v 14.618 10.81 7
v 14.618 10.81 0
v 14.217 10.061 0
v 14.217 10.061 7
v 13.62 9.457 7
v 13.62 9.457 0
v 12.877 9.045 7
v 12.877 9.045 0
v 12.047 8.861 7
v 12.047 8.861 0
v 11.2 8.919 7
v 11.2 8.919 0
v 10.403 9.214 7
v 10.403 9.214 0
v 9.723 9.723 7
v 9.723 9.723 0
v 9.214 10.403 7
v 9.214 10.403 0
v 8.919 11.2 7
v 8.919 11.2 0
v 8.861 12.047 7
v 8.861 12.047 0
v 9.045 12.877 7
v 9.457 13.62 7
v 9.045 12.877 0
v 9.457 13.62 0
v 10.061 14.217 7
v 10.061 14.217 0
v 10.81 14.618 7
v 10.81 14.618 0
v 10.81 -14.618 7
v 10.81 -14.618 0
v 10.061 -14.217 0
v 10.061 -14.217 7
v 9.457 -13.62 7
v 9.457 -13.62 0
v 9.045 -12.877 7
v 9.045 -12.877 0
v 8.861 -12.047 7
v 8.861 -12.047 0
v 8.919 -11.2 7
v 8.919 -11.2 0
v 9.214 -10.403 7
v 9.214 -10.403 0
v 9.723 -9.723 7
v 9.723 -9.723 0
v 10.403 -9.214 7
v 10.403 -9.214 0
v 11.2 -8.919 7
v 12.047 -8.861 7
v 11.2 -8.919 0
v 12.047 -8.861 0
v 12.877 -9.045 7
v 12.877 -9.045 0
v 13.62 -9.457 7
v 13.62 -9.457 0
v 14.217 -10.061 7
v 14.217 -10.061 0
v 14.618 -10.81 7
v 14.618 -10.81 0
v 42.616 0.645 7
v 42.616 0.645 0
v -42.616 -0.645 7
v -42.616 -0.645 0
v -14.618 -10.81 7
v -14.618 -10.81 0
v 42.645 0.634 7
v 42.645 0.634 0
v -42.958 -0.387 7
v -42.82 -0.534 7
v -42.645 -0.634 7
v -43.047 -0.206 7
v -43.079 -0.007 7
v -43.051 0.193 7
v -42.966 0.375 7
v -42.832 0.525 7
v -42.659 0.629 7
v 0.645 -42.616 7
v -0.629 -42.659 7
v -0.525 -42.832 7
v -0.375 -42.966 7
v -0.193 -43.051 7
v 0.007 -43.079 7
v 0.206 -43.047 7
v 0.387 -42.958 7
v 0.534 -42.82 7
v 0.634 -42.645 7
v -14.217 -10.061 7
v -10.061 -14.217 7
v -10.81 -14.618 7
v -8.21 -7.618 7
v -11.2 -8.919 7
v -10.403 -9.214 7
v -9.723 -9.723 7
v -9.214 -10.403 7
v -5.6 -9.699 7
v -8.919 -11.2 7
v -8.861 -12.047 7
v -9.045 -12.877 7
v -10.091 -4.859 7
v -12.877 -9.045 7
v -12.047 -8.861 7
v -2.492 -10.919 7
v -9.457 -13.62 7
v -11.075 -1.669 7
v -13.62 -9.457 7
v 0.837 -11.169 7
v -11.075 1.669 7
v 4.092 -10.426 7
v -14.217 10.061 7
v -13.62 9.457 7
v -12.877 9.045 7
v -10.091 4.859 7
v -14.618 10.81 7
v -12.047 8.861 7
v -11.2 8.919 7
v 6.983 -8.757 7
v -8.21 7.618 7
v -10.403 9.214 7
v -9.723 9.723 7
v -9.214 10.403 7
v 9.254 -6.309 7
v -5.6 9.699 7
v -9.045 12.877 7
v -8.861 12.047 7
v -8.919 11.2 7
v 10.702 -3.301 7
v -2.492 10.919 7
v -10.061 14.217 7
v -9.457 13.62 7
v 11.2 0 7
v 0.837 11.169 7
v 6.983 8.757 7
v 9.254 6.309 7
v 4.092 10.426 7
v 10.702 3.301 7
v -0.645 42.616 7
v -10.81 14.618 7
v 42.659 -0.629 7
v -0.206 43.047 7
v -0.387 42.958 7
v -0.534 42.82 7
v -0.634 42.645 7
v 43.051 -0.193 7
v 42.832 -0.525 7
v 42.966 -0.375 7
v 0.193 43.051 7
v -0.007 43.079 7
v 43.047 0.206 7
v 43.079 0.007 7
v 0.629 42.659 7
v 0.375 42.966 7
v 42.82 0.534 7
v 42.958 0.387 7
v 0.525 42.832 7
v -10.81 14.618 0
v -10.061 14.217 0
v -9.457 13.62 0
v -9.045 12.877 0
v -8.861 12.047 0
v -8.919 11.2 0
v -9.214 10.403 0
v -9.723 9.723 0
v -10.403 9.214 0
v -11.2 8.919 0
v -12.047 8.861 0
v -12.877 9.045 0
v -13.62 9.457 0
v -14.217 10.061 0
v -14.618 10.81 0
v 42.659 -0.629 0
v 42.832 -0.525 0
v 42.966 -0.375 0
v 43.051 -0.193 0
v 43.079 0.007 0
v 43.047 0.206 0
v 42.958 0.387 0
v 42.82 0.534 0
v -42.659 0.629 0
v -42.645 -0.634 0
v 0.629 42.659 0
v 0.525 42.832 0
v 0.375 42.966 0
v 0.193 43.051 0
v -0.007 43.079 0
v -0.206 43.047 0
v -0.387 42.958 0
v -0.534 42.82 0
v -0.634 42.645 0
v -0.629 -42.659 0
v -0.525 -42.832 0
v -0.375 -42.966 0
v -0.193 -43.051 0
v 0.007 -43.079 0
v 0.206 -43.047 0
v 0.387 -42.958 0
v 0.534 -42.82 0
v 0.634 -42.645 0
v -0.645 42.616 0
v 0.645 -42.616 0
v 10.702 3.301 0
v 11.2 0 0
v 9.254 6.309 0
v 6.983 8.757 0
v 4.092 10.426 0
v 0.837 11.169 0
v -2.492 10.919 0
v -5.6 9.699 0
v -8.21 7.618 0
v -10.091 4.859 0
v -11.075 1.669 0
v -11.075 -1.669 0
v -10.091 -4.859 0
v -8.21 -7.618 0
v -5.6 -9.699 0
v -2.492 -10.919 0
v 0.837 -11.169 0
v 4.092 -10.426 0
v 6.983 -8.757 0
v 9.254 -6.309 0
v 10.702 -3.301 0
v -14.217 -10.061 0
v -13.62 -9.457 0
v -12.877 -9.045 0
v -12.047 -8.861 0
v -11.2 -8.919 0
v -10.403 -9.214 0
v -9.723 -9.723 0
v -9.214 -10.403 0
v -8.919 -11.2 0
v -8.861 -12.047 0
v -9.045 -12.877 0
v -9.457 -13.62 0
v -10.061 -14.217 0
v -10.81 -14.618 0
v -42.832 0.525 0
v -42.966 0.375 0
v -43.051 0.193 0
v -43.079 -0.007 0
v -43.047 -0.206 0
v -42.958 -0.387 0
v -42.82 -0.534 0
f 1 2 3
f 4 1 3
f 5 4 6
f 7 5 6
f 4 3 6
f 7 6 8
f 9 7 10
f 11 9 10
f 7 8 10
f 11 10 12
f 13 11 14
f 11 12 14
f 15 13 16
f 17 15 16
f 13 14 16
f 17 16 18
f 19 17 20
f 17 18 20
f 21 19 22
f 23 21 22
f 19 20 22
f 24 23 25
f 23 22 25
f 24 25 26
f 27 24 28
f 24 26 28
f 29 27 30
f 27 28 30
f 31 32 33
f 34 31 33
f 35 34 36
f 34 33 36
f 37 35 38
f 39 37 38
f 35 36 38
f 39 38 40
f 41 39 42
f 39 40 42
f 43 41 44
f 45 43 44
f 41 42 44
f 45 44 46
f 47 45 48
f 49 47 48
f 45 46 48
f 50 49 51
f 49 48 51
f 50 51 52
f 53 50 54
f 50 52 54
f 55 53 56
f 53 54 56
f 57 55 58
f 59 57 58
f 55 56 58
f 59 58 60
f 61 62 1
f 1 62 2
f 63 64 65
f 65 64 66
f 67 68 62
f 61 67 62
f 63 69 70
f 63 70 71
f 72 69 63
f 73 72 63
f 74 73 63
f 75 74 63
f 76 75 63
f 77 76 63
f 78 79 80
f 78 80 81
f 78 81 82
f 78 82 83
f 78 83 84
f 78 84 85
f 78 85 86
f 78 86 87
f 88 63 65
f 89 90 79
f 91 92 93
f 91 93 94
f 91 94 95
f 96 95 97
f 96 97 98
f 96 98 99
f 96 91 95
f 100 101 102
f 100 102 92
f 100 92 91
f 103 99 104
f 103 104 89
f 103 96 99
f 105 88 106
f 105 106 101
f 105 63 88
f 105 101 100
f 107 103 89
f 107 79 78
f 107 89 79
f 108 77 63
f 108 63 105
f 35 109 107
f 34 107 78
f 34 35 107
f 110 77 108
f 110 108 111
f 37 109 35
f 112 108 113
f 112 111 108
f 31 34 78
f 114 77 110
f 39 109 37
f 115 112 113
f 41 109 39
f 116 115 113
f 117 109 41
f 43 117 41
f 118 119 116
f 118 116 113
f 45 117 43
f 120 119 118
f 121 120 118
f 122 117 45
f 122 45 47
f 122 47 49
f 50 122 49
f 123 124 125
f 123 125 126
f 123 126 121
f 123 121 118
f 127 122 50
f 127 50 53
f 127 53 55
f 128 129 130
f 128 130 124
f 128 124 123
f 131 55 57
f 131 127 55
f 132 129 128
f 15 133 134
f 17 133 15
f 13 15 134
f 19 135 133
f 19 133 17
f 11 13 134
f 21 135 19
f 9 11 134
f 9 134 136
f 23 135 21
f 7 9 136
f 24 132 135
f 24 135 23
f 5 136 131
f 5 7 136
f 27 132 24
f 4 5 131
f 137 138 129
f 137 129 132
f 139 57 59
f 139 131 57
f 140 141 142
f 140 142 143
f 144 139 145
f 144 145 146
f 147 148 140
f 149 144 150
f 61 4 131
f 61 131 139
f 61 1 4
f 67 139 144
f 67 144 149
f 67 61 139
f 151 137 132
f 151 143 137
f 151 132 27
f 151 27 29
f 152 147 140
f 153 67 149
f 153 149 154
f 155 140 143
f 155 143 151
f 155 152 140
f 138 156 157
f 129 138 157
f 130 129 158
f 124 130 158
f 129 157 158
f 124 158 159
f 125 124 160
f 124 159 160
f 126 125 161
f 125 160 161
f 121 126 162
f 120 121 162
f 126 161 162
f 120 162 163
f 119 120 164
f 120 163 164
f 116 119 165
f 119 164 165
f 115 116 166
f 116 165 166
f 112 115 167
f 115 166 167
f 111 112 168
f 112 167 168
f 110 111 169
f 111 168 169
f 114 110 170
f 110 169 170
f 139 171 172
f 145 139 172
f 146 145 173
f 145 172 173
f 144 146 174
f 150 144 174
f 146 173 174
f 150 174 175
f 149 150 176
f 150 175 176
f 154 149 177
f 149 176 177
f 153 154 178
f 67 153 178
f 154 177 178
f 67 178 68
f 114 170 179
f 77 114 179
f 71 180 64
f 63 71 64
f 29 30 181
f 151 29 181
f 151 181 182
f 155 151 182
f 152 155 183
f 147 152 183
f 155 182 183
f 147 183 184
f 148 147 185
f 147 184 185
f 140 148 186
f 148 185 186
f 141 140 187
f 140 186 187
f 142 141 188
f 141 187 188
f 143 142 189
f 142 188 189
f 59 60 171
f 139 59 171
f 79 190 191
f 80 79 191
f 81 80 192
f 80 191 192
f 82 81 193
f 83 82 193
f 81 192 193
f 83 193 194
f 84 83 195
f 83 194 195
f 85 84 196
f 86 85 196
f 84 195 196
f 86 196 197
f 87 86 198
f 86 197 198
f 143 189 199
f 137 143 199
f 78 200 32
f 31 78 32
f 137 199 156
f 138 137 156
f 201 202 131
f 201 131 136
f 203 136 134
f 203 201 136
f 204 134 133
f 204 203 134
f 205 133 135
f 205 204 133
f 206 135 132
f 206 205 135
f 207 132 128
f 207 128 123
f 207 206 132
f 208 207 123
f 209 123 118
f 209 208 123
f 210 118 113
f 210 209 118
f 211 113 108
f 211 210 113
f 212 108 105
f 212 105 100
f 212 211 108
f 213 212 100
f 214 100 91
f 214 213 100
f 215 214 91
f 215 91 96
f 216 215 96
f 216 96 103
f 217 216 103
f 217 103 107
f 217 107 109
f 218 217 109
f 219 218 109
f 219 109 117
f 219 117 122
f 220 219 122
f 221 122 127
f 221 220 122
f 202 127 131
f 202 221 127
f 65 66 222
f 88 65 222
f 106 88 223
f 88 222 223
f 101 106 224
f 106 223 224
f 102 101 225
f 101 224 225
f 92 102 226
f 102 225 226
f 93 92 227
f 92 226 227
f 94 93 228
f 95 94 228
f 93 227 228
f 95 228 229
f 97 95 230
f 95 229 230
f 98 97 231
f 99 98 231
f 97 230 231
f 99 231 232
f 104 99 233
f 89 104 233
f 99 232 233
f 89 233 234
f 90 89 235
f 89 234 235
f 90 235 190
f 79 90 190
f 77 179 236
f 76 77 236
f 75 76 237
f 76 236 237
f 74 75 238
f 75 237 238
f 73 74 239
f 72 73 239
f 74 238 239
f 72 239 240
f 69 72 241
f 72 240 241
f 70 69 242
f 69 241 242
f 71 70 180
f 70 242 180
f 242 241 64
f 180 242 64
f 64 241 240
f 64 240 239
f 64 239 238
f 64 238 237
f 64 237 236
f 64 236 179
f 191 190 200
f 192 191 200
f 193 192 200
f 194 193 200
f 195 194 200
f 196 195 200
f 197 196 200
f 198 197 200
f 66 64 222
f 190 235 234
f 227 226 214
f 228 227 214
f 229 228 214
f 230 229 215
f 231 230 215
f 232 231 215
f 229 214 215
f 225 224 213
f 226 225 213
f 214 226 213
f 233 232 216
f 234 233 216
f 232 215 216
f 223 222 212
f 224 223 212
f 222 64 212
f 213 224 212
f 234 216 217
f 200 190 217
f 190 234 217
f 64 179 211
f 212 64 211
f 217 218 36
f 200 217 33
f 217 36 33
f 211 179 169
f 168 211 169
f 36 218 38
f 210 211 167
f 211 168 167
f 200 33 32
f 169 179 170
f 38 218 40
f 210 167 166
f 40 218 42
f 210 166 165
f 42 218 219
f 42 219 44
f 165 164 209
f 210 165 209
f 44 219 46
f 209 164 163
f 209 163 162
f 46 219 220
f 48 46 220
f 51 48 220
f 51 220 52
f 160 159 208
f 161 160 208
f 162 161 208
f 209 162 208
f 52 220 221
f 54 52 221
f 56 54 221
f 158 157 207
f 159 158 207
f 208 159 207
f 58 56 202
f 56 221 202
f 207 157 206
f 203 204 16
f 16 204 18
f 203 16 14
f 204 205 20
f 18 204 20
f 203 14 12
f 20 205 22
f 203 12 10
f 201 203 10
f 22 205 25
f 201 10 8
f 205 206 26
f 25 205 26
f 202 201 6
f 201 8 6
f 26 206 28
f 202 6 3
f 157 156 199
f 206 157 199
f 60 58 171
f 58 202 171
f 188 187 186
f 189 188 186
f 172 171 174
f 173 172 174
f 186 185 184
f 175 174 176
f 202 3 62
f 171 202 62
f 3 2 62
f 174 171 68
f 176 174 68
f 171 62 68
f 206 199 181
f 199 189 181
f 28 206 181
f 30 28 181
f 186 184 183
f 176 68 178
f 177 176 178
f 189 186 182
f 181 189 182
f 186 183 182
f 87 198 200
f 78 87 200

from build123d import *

# Parameters (mm, degrees)
F0_R     = 11.2
F1_DEPTH = 7


with BuildPart() as f1:
    # F0 (on Top) → F1 (new body)
    with BuildSketch(Plane.XY):
        with BuildLine():
            ThreePointArc((0.629275, 42.658791), (-0.007055, 43.079038), (-0.634205, 42.645211))
            Line((-0.634205, 42.645211), (-0.644867, 42.615845))
            Line((-0.644867, 42.615845), (-10.810192, 14.617693))
            ThreePointArc((-10.810192, 14.617693), (-9.723034, 9.72304), (-14.617687, 10.810197))
            Line((-14.617687, 10.810197), (-42.658791, 0.629275))
            ThreePointArc((-42.658791, 0.629275), (-43.079038, -0.007039), (-42.64524, -0.634194))
            Line((-42.64524, -0.634194), (-42.615845, -0.644866))
            Line((-42.615845, -0.644866), (-14.617691, -10.810185))
            ThreePointArc((-14.617691, -10.810185), (-9.723041, -9.723034), (-10.810191, -14.617685))
            Line((-10.810191, -14.617685), (-0.629275, -42.658791))
            ThreePointArc((-0.629275, -42.658791), (0.007037, -43.079038), (0.634193, -42.645243))
            Line((0.634193, -42.645243), (0.644866, -42.615845))
            Line((0.644866, -42.615845), (10.810179, -14.617689))
            ThreePointArc((10.810179, -14.617689), (9.723034, -9.72304), (14.617682, -10.810185))
            Line((14.617682, -10.810185), (42.658791, -0.629275))
            ThreePointArc((42.658791, -0.629275), (43.079038, 0.007064), (42.645194, 0.634212))
            Line((42.645194, 0.634212), (42.615845, 0.644868))
            Line((42.615845, 0.644868), (14.617696, 10.810198))
            ThreePointArc((14.617696, 10.810198), (9.72304, 9.723034), (10.810204, 14.617689))
            Line((10.810204, 14.617689), (0.629275, 42.658791))
        make_face()
        Circle(F0_R, mode=Mode.SUBTRACT)
    extrude(amount=F1_DEPTH)


solid = f1.part
